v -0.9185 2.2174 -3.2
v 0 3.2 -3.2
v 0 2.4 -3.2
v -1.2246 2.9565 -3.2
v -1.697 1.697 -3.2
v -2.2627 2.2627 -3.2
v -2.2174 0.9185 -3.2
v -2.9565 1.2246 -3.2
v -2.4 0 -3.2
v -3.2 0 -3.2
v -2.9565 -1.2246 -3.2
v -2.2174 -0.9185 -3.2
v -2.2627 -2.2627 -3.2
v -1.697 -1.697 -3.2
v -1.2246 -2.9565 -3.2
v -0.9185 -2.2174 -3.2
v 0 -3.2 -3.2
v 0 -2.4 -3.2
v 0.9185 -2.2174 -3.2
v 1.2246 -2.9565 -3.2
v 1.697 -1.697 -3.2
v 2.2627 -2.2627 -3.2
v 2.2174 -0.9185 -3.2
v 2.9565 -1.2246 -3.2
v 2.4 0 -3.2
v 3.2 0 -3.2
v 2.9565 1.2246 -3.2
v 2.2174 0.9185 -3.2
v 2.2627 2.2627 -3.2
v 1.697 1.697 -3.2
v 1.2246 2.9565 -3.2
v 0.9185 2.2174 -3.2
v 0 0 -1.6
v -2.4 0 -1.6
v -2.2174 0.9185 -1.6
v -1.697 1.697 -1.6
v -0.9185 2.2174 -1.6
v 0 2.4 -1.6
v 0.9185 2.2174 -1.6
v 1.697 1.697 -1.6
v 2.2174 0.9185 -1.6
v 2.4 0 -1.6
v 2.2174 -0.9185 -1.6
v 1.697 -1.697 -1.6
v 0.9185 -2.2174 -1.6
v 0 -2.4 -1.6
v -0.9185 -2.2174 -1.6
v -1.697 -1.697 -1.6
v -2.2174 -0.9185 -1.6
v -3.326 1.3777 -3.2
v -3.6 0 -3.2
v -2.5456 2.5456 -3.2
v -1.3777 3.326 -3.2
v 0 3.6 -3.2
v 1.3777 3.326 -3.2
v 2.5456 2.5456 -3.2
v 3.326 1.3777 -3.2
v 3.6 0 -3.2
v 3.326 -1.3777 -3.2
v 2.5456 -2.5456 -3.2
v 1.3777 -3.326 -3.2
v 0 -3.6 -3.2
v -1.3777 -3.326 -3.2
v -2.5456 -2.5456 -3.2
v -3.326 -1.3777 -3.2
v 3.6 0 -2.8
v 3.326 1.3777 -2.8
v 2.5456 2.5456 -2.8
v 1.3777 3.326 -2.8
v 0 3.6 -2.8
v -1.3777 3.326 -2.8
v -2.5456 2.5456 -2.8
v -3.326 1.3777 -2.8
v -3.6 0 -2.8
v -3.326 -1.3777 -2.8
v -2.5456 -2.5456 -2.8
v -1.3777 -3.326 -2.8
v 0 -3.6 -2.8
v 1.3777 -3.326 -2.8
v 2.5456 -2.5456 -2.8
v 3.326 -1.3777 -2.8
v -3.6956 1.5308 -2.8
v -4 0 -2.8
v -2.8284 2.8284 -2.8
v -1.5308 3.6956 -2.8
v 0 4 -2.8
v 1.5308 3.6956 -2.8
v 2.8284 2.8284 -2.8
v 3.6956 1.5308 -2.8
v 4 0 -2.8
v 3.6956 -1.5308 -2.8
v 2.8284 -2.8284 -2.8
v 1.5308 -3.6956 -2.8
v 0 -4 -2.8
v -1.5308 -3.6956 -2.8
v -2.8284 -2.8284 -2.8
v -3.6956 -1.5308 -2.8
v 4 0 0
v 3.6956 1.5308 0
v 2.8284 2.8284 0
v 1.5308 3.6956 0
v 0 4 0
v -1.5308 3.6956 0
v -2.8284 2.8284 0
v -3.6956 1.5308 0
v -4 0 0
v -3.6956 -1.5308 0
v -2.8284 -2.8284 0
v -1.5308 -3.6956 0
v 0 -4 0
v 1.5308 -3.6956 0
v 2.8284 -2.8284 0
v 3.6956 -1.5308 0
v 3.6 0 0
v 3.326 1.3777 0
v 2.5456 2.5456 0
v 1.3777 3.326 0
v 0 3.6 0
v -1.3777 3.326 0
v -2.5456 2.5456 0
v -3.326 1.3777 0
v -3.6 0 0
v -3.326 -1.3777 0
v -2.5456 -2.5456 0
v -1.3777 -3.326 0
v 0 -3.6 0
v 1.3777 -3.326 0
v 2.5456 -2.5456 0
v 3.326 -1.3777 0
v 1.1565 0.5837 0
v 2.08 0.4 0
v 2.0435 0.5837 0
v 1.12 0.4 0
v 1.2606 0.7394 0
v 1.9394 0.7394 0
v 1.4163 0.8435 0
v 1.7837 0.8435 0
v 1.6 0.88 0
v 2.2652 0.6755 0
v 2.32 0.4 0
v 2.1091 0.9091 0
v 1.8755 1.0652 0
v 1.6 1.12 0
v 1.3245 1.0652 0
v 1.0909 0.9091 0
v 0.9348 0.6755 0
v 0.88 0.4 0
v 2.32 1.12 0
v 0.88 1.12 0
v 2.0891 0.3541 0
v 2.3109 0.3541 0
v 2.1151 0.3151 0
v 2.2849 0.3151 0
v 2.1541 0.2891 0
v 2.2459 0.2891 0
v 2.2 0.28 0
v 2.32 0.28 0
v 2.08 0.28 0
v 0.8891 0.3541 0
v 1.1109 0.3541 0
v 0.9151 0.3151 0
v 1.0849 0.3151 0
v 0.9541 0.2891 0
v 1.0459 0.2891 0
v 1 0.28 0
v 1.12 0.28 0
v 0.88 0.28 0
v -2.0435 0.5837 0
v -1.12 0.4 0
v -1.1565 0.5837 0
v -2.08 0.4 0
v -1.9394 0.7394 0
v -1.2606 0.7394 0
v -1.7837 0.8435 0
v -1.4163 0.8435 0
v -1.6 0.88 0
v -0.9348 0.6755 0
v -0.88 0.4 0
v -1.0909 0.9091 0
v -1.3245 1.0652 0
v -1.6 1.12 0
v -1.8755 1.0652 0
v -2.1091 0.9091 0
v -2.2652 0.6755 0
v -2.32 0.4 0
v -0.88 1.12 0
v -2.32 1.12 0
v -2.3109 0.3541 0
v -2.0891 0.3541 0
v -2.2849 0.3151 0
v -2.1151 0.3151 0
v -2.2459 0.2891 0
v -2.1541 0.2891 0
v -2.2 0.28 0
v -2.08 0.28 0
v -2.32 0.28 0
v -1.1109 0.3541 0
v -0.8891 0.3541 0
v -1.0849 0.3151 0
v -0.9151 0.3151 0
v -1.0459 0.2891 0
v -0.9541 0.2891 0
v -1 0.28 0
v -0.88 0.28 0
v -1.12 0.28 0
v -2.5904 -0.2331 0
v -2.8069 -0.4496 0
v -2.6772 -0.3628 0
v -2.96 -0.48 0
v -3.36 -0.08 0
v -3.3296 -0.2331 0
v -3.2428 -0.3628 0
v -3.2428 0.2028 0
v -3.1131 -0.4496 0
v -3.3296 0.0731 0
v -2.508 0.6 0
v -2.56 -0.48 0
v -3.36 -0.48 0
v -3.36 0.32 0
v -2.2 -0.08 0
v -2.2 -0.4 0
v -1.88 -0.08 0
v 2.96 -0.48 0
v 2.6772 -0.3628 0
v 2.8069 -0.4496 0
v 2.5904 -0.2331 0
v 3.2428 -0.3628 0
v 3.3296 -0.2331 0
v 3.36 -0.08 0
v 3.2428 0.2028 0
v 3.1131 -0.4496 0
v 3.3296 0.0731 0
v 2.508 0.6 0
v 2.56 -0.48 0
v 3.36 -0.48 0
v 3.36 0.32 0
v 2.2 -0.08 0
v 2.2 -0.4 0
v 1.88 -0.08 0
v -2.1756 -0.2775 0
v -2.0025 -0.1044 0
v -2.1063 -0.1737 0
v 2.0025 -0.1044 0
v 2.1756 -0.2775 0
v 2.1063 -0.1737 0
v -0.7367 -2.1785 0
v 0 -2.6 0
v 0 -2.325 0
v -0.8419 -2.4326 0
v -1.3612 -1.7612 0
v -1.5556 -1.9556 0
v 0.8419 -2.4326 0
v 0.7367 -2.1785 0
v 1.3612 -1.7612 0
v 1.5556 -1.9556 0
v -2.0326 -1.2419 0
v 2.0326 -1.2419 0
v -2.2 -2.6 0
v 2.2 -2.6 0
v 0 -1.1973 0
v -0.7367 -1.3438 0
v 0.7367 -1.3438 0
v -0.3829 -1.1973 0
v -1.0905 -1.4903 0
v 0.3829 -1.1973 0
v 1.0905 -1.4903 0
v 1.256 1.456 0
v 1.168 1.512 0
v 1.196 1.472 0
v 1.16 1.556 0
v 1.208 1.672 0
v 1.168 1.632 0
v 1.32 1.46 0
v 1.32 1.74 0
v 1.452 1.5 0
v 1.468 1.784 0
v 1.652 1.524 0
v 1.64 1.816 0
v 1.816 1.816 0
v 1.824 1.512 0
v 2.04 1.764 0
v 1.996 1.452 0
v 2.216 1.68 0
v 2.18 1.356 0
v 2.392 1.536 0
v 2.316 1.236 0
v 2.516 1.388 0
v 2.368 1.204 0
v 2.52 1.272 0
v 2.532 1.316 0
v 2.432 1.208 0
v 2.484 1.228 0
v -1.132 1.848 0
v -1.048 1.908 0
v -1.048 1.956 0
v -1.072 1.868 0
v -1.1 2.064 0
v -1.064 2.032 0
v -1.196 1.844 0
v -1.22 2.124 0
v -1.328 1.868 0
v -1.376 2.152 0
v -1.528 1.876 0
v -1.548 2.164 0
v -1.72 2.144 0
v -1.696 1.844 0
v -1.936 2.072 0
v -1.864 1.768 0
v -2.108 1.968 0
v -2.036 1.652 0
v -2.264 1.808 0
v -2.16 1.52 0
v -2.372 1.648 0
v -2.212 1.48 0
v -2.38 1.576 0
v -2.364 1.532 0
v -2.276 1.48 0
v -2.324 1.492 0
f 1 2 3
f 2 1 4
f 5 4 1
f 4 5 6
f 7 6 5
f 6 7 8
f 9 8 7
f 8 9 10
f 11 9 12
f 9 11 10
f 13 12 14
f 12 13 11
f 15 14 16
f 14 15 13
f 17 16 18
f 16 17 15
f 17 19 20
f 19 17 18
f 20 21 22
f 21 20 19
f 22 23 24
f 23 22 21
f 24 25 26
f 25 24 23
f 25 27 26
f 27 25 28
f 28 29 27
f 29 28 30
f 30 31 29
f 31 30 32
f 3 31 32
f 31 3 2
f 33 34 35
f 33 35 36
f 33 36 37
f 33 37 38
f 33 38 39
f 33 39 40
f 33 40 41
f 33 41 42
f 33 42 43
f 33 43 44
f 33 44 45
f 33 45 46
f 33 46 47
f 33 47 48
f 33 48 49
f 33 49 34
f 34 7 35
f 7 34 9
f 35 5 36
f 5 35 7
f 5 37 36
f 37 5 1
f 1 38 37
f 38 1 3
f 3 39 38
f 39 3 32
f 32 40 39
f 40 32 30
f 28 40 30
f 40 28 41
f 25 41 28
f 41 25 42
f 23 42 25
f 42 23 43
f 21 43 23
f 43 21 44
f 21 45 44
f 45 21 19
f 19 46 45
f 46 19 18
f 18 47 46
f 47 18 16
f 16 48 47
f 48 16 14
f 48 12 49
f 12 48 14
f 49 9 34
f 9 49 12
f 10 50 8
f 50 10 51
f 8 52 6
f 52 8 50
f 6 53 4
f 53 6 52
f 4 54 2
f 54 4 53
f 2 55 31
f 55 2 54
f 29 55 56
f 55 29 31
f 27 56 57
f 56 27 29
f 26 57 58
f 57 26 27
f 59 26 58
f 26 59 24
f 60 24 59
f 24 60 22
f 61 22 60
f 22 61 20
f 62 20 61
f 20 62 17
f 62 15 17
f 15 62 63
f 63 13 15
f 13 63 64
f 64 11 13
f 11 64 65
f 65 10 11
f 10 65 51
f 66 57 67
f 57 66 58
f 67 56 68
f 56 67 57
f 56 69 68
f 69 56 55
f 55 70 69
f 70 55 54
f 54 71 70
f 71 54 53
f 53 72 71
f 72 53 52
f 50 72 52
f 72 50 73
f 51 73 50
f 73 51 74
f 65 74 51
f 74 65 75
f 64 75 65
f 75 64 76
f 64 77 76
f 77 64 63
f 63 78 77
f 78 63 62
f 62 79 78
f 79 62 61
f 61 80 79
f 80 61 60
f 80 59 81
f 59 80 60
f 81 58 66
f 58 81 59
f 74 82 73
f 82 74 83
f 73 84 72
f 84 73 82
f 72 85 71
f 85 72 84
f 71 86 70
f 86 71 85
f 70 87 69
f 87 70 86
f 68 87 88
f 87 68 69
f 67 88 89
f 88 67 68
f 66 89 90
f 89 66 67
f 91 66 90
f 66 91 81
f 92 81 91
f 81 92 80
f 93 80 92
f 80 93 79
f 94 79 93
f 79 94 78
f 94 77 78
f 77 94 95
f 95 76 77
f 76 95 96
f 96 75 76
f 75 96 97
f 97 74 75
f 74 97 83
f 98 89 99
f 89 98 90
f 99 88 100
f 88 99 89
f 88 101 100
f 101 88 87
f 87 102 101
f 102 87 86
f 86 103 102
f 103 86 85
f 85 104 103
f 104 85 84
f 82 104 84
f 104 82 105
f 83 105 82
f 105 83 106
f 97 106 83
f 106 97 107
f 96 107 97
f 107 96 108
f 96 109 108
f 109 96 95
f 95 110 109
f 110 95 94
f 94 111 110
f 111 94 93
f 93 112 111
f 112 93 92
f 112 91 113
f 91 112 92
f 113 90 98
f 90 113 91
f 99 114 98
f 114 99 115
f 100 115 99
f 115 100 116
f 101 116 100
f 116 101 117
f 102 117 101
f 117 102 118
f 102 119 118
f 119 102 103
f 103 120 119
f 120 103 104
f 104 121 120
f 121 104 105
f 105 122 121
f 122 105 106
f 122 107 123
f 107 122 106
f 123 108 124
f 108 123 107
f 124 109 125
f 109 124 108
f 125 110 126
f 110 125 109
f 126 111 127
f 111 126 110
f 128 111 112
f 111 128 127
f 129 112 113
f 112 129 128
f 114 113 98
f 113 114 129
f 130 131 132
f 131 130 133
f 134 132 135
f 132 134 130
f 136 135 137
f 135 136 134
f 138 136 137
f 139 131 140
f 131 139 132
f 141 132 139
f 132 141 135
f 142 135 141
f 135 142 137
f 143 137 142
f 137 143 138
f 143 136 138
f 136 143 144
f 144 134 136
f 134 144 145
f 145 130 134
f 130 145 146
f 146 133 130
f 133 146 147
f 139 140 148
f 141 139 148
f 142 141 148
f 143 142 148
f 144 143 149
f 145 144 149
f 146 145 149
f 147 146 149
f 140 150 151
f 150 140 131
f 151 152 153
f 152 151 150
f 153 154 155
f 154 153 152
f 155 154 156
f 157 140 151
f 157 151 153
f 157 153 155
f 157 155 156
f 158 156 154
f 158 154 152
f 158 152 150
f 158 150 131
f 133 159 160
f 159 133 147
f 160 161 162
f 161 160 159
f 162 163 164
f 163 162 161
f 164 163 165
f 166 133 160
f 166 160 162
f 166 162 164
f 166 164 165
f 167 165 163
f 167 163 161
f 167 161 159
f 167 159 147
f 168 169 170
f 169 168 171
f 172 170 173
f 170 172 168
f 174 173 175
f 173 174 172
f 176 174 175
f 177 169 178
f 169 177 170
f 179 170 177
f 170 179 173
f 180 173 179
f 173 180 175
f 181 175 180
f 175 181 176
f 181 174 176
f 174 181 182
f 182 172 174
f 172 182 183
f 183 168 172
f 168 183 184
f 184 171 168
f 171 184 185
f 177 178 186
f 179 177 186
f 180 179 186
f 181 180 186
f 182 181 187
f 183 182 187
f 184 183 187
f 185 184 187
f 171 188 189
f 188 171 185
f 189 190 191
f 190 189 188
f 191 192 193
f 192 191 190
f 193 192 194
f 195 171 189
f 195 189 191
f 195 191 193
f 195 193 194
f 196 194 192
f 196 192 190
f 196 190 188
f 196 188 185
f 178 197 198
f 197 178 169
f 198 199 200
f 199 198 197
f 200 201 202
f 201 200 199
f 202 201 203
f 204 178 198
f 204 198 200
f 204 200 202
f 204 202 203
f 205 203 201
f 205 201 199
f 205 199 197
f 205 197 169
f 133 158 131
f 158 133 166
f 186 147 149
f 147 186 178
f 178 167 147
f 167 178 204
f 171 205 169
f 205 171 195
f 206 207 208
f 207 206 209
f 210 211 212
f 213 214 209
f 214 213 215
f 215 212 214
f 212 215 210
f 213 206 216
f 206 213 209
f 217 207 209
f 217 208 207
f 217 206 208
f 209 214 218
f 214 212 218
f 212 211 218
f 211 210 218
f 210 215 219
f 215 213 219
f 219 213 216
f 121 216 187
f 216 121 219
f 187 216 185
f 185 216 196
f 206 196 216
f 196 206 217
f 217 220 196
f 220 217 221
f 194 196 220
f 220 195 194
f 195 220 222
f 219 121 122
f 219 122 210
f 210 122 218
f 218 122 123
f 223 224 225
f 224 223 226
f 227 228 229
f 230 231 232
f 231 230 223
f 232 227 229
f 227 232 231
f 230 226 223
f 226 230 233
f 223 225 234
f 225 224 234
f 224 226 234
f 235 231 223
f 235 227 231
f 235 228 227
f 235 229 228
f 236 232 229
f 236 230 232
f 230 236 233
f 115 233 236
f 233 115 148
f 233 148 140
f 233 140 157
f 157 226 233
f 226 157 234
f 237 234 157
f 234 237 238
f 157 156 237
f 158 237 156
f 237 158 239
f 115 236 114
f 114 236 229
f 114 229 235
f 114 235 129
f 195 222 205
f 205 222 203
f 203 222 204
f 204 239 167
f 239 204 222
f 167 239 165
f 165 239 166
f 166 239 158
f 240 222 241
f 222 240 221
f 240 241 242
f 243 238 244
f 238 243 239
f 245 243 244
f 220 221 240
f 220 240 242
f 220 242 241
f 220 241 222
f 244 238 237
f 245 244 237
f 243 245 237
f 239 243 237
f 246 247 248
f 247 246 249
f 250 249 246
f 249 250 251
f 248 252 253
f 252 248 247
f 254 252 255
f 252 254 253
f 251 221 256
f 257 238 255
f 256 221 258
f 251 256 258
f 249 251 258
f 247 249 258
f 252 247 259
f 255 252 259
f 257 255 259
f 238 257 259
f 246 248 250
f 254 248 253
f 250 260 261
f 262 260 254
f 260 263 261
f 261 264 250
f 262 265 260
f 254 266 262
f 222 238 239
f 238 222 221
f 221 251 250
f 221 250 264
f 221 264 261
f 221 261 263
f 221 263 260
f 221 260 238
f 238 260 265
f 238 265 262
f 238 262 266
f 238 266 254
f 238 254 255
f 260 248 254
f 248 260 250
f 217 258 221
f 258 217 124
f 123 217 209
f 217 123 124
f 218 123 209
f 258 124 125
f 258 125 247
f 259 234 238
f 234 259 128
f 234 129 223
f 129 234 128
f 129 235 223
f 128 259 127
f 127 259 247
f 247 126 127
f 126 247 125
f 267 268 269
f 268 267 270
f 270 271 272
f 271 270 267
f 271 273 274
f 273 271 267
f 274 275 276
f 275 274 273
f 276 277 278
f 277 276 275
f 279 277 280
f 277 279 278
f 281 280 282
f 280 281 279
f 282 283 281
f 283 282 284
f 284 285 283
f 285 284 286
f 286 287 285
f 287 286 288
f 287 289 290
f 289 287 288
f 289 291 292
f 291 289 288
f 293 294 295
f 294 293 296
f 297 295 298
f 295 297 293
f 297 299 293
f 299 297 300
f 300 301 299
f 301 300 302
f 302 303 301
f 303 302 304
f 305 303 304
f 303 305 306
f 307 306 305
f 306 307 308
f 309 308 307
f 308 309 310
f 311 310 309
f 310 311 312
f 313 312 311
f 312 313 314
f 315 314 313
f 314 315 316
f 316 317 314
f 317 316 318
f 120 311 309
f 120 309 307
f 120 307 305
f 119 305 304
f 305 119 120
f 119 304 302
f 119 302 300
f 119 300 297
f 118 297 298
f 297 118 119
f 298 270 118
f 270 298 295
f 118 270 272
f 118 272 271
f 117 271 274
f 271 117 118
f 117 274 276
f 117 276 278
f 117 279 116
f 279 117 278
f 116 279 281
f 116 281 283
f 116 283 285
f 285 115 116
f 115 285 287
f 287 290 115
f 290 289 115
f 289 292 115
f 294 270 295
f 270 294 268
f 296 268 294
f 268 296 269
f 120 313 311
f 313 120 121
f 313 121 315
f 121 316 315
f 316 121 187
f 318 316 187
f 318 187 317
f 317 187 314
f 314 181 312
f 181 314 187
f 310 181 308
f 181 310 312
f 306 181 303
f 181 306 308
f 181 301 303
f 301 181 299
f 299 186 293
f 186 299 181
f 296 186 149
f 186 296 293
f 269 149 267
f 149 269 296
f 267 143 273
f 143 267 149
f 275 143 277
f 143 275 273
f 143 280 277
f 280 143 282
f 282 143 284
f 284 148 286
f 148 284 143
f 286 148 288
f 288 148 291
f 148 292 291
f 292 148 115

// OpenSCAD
use <../lib.scad>
use <../p/1-4chrd.scad>
use <../p/1-4ndis.scad>
use <../p/1-8chrd.scad>
use <../p/1-8ring7.scad>
use <../p/1-8tang.scad>
use <../p/2-4chrd.scad>
use <../p/2-4ndis.scad>
use <../p/2-4ring2.scad>
use <../p/3-16chrd.scad>
use <../p/3-16ndis.scad>
use <../p/3-8chrd.scad>
use <../p/3-8ndis.scad>
use <../p/4-4ering.scad>
use <s/98138s01.scad>
function ldraw_lib__98138p1t() = [
// 0 Tile  1 x  1 Round with Bright Light Yellow Emoji with Wide Open Laughing Mouth with Coral Tongue and Medium Azure Tears of Joy Pattern
// 0 Name: 98138p1t.dat
// 0 Author: Gerald Lasser [GeraldLasser]
// 0 !LDRAW_ORG Part UPDATE 2022-01
// 0 !LICENSE Licensed under CC BY 4.0 : see CAreadme.txt
// 
// 0 BFC CERTIFY CCW
  [0,"BFC","CERTIFY"],
  [0,"BFC","CCW"],
// 
// 0 !KEYWORDS Bricklink 98138pb130, Creativity Box, Dots, Funny, happy, Set 41908
// 0 !KEYWORDS Squinted Eyes
// 
// 0 !HISTORY 2022-01-14 [PTadmin] Official Update 2022-01
// 
// 
// 1 16 0 0 0 1 0 0 0 1 0 0 0 1 s\98138s01.dat
  [1,16,0,0,0,1,0,0,0,1,0,0,0,1, ldraw_lib__s__98138s01()],
// 1 226 0 0 0 9 0 0 0 1 0 0 0 9 4-4ering.dat
  [1,226,0,0,0,9,0,0,0,1,0,0,0,9, ldraw_lib__4_4ering()],
// 
// 0 // Eyes
// 1 226 4 0 1 1.2 0 0 0 1 0 0 0 1.2 2-4chrd.dat
  [1,226,4,0,1,1.2,0,0,0,1,0,0,0,1.2, ldraw_lib__2_4chrd()],
// 1 0 4 0 1 .6 0 0 0 1 0 0 0 .6 2-4ring2.dat
  [1,0,4,0,1,.6,0,0,0,1,0,0,0,.6, ldraw_lib__2_4ring2()],
// 1 226 4 0 1 1.8 0 0 0 1 0 0 0 1.8 2-4ndis.dat
  [1,226,4,0,1,1.8,0,0,0,1,0,0,0,1.8, ldraw_lib__2_4ndis()],
// 1 0 5.5 0 1 .3 0 0 0 1 0 0 0 -.3 2-4chrd.dat
  [1,0,5.5,0,1,.3,0,0,0,1,0,0,0,-.3, ldraw_lib__2_4chrd()],
// 1 226 5.5 0 1 .3 0 0 0 1 0 0 0 -.3 2-4ndis.dat
  [1,226,5.5,0,1,.3,0,0,0,1,0,0,0,-.3, ldraw_lib__2_4ndis()],
// 1 0 2.5 0 1 .3 0 0 0 1 0 0 0 -.3 2-4chrd.dat
  [1,0,2.5,0,1,.3,0,0,0,1,0,0,0,-.3, ldraw_lib__2_4chrd()],
// 1 226 2.5 0 1 .3 0 0 0 1 0 0 0 -.3 2-4ndis.dat
  [1,226,2.5,0,1,.3,0,0,0,1,0,0,0,-.3, ldraw_lib__2_4ndis()],
// 
// 1 226 -4 0 1 1.2 0 0 0 1 0 0 0 1.2 2-4chrd.dat
  [1,226,-4,0,1,1.2,0,0,0,1,0,0,0,1.2, ldraw_lib__2_4chrd()],
// 1 0 -4 0 1 .6 0 0 0 1 0 0 0 .6 2-4ring2.dat
  [1,0,-4,0,1,.6,0,0,0,1,0,0,0,.6, ldraw_lib__2_4ring2()],
// 1 226 -4 0 1 1.8 0 0 0 1 0 0 0 1.8 2-4ndis.dat
  [1,226,-4,0,1,1.8,0,0,0,1,0,0,0,1.8, ldraw_lib__2_4ndis()],
// 1 0 -5.5 0 1 .3 0 0 0 1 0 0 0 -.3 2-4chrd.dat
  [1,0,-5.5,0,1,.3,0,0,0,1,0,0,0,-.3, ldraw_lib__2_4chrd()],
// 1 226 -5.5 0 1 .3 0 0 0 1 0 0 0 -.3 2-4ndis.dat
  [1,226,-5.5,0,1,.3,0,0,0,1,0,0,0,-.3, ldraw_lib__2_4ndis()],
// 1 0 -2.5 0 1 .3 0 0 0 1 0 0 0 -.3 2-4chrd.dat
  [1,0,-2.5,0,1,.3,0,0,0,1,0,0,0,-.3, ldraw_lib__2_4chrd()],
// 1 226 -2.5 0 1 .3 0 0 0 1 0 0 0 -.3 2-4ndis.dat
  [1,226,-2.5,0,1,.3,0,0,0,1,0,0,0,-.3, ldraw_lib__2_4ndis()],
// 
// 4 226 2.8 0 1 2.8 0 .7 5.2 0 .7 5.2 0 1
  [4,226,2.8,0,1,2.8,0,.7,5.2,0,.7,5.2,0,1],
// 4 226 -2.2 0 1 2.2 0 1 2.2 0 2.8 -2.2 0 2.8
  [4,226,-2.2,0,1,2.2,0,1,2.2,0,2.8,-2.2,0,2.8],
// 4 226 -2.2 0 .7 2.2 0 .7 2.2 0 1 -2.2 0 1
  [4,226,-2.2,0,.7,2.2,0,.7,2.2,0,1,-2.2,0,1],
// 4 226 -2.8 0 1 -5.2 0 1 -5.2 0 .7 -2.8 0 .7
  [4,226,-2.8,0,1,-5.2,0,1,-5.2,0,.7,-2.8,0,.7],
// 
// 0 // Tears
// 1 322 -7.4 0 -.2 0 0 1 0 1 0 -1 0 0 3-16chrd.dat
  [1,322,-7.4,0,-.2,0,0,1,0,1,0,-1,0,0, ldraw_lib__3_16chrd()],
// 1 322 -7.4 0 -.2 0 0 -1 0 1 0 -1 0 0 3-8chrd.dat
  [1,322,-7.4,0,-.2,0,0,-1,0,1,0,-1,0,0, ldraw_lib__3_8chrd()],
// 4 322 -6.27 0 1.5 -8.1071 0 .5071 -7.4 0 -1.2 -6.4761 0 -.5827
  [4,322,-6.27,0,1.5,-8.1071,0,.5071,-7.4,0,-1.2,-6.4761,0,-.5827],
// 1 226 -7.4 0 -.2 0 0 1 0 1 0 -1 0 0 3-16ndis.dat
  [1,226,-7.4,0,-.2,0,0,1,0,1,0,-1,0,0, ldraw_lib__3_16ndis()],
// 1 226 -7.4 0 -.2 0 0 -1 0 1 0 -1 0 0 3-8ndis.dat
  [1,226,-7.4,0,-.2,0,0,-1,0,1,0,-1,0,0, ldraw_lib__3_8ndis()],
// 
// 3 226 -8.4 0 .8 -8.1071 0 .5071 -6.27 0 1.5
  [3,226,-8.4,0,.8,-8.1071,0,.5071,-6.27,0,1.5],
// 4 226 -8.4 0 .8 -6.27 0 1.5 -5.8 0 2.8 -8.3151 0 3.4443
  [4,226,-8.4,0,.8,-6.27,0,1.5,-5.8,0,2.8,-8.3151,0,3.4443],
// 3 226 -5.8 0 2.8 -6.27 0 1.5 -5.8 0 1
  [3,226,-5.8,0,2.8,-6.27,0,1.5,-5.8,0,1],
// 3 226 -5.8 0 1 -6.27 0 1.5 -5.8 0 .7
  [3,226,-5.8,0,1,-6.27,0,1.5,-5.8,0,.7],
// 4 226 -6.4 0 -1.2 -5.8 0 .7 -6.27 0 1.5 -6.4761 0 -.5827
  [4,226,-6.4,0,-1.2,-5.8,0,.7,-6.27,0,1.5,-6.4761,0,-.5827],
// 4 226 -5.5 0 -1 -5.5 0 -.2 -5.8 0 .7 -6.4 0 -1.2
  [4,226,-5.5,0,-1,-5.5,0,-.2,-5.8,0,.7,-6.4,0,-1.2],
// 3 226 -5.5 0 .7 -5.8 0 .7 -5.5 0 -.2
  [3,226,-5.5,0,.7,-5.8,0,.7,-5.5,0,-.2],
// 4 226 -4.7 0 -.2 -5.2 0 .7 -5.5 0 .7 -5.5 0 -.2
  [4,226,-4.7,0,-.2,-5.2,0,.7,-5.5,0,.7,-5.5,0,-.2],
// 3 226 -8.4 0 .8 -8.3151 0 3.4443 -9 0 0
  [3,226,-8.4,0,.8,-8.3151,0,3.4443,-9,0,0],
// 3 226 -8.4 0 .8 -9 0 0 -8.4 0 -.2
  [3,226,-8.4,0,.8,-9,0,0,-8.4,0,-.2],
// 3 226 -8.4 0 -.2 -9 0 0 -8.4 0 -1.2
  [3,226,-8.4,0,-.2,-9,0,0,-8.4,0,-1.2],
// 3 226 -8.4 0 -1.2 -9 0 0 -8.3151 0 -3.4443
  [3,226,-8.4,0,-1.2,-9,0,0,-8.3151,0,-3.4443],
// 
// 1 322 7.4 0 -.2 0 0 -1 0 1 0 -1 0 0 3-16chrd.dat
  [1,322,7.4,0,-.2,0,0,-1,0,1,0,-1,0,0, ldraw_lib__3_16chrd()],
// 1 322 7.4 0 -.2 0 0 1 0 1 0 -1 0 0 3-8chrd.dat
  [1,322,7.4,0,-.2,0,0,1,0,1,0,-1,0,0, ldraw_lib__3_8chrd()],
// 4 322 7.4 0 -1.2 8.1071 0 .5071 6.27 0 1.5 6.4761 0 -.5827
  [4,322,7.4,0,-1.2,8.1071,0,.5071,6.27,0,1.5,6.4761,0,-.5827],
// 1 226 7.4 0 -.2 0 0 -1 0 1 0 -1 0 0 3-16ndis.dat
  [1,226,7.4,0,-.2,0,0,-1,0,1,0,-1,0,0, ldraw_lib__3_16ndis()],
// 1 226 7.4 0 -.2 0 0 1 0 1 0 -1 0 0 3-8ndis.dat
  [1,226,7.4,0,-.2,0,0,1,0,1,0,-1,0,0, ldraw_lib__3_8ndis()],
// 
// 3 226 8.1071 0 .5071 8.4 0 .8 6.27 0 1.5
  [3,226,8.1071,0,.5071,8.4,0,.8,6.27,0,1.5],
// 4 226 5.8 0 2.8 6.27 0 1.5 8.4 0 .8 8.3151 0 3.4443
  [4,226,5.8,0,2.8,6.27,0,1.5,8.4,0,.8,8.3151,0,3.4443],
// 3 226 6.27 0 1.5 5.8 0 2.8 5.8 0 1
  [3,226,6.27,0,1.5,5.8,0,2.8,5.8,0,1],
// 3 226 6.27 0 1.5 5.8 0 1 5.8 0 .7
  [3,226,6.27,0,1.5,5.8,0,1,5.8,0,.7],
// 4 226 6.27 0 1.5 5.8 0 .7 6.4 0 -1.2 6.4761 0 -.5827
  [4,226,6.27,0,1.5,5.8,0,.7,6.4,0,-1.2,6.4761,0,-.5827],
// 4 226 5.8 0 .7 5.5 0 -.2 5.5 0 -1 6.4 0 -1.2
  [4,226,5.8,0,.7,5.5,0,-.2,5.5,0,-1,6.4,0,-1.2],
// 3 226 5.8 0 .7 5.5 0 .7 5.5 0 -.2
  [3,226,5.8,0,.7,5.5,0,.7,5.5,0,-.2],
// 4 226 5.5 0 .7 5.2 0 .7 4.7 0 -.2 5.5 0 -.2
  [4,226,5.5,0,.7,5.2,0,.7,4.7,0,-.2,5.5,0,-.2],
// 3 226 8.3151 0 3.4443 8.4 0 .8 9 0 0
  [3,226,8.3151,0,3.4443,8.4,0,.8,9,0,0],
// 3 226 9 0 0 8.4 0 .8 8.4 0 -.2
  [3,226,9,0,0,8.4,0,.8,8.4,0,-.2],
// 3 226 9 0 0 8.4 0 -.2 8.4 0 -1.2
  [3,226,9,0,0,8.4,0,-.2,8.4,0,-1.2],
// 3 226 9 0 0 8.4 0 -1.2 8.3151 0 -3.4443
  [3,226,9,0,0,8.4,0,-1.2,8.3151,0,-3.4443],
// 
// 0 // Mouth
// 3 226 -5.2 0 .7 -4.7 0 -.2 -2.8 0 .7
  [3,226,-5.2,0,.7,-4.7,0,-.2,-2.8,0,.7],
// 3 226 -2.8 0 .7 -4.7 0 -.2 -2.5 0 .7
  [3,226,-2.8,0,.7,-4.7,0,-.2,-2.5,0,.7],
// 3 226 -2.5 0 .7 -4.7 0 -.2 -2.2 0 .7
  [3,226,-2.5,0,.7,-4.7,0,-.2,-2.2,0,.7],
// 4 226 4.7 0 -.2 2.2 0 .7 -2.2 0 .7 -4.7 0 -.2
  [4,226,4.7,0,-.2,2.2,0,.7,-2.2,0,.7,-4.7,0,-.2],
// 3 226 2.2 0 .7 4.7 0 -.2 2.5 0 .7
  [3,226,2.2,0,.7,4.7,0,-.2,2.5,0,.7],
// 3 226 2.5 0 .7 4.7 0 -.2 2.8 0 .7
  [3,226,2.5,0,.7,4.7,0,-.2,2.8,0,.7],
// 3 226 2.8 0 .7 4.7 0 -.2 5.2 0 .7
  [3,226,2.8,0,.7,4.7,0,-.2,5.2,0,.7],
// 
// 1 0 -4.7 0 -1 -.8 0 0 0 1 0 0 0 .8 1-4chrd.dat
  [1,0,-4.7,0,-1,-.8,0,0,0,1,0,0,0,.8, ldraw_lib__1_4chrd()],
// 1 0 4.7 0 -1 .8 0 0 0 1 0 0 0 .8 1-4chrd.dat
  [1,0,4.7,0,-1,.8,0,0,0,1,0,0,0,.8, ldraw_lib__1_4chrd()],
// 1 226 -4.7 0 -1 -.8 0 0 0 1 0 0 0 .8 1-4ndis.dat
  [1,226,-4.7,0,-1,-.8,0,0,0,1,0,0,0,.8, ldraw_lib__1_4ndis()],
// 1 226 4.7 0 -1 .8 0 0 0 1 0 0 0 .8 1-4ndis.dat
  [1,226,4.7,0,-1,.8,0,0,0,1,0,0,0,.8, ldraw_lib__1_4ndis()],
// 1 0 0 0 -1 0 0 -.6875 0 1 0 -.6875 0 0 1-8ring7.dat
  [1,0,0,0,-1,0,0,-.6875,0,1,0,-.6875,0,0, ldraw_lib__1_8ring7()],
// 1 0 0 0 -1 0 0 .6875 0 1 0 -.6875 0 0 1-8ring7.dat
  [1,0,0,0,-1,0,0,.6875,0,1,0,-.6875,0,0, ldraw_lib__1_8ring7()],
// 1 0 0 0 -1 -5.5 0 0 0 1 0 0 0 -5.5 1-8chrd.dat
  [1,0,0,0,-1,-5.5,0,0,0,1,0,0,0,-5.5, ldraw_lib__1_8chrd()],
// 1 0 0 0 -1 5.5 0 0 0 1 0 0 0 -5.5 1-8chrd.dat
  [1,0,0,0,-1,5.5,0,0,0,1,0,0,0,-5.5, ldraw_lib__1_8chrd()],
// 1 226 0 0 -1 -5.5 0 0 0 1 0 0 0 -5.5 2-4ndis.dat
  [1,226,0,0,-1,-5.5,0,0,0,1,0,0,0,-5.5, ldraw_lib__2_4ndis()],
// 
// 1 353 0 0 -1 0 0 -4.8125 0 1 0 -4.8125 0 0 1-8chrd.dat
  [1,353,0,0,-1,0,0,-4.8125,0,1,0,-4.8125,0,0, ldraw_lib__1_8chrd()],
// 1 353 0 0 -1 0 0 4.8125 0 1 0 -4.8125 0 0 1-8chrd.dat
  [1,353,0,0,-1,0,0,4.8125,0,1,0,-4.8125,0,0, ldraw_lib__1_8chrd()],
// 1 353 0 0 -7.8058 0 0 -4.8125 0 1 0 4.8125 0 0 1-8chrd.dat
  [1,353,0,0,-7.8058,0,0,-4.8125,0,1,0,4.8125,0,0, ldraw_lib__1_8chrd()],
// 1 353 0 0 -7.8058 0 0 4.8125 0 1 0 4.8125 0 0 1-8chrd.dat
  [1,353,0,0,-7.8058,0,0,4.8125,0,1,0,4.8125,0,0, ldraw_lib__1_8chrd()],
// 1 0 0 0 -7.8058 0 0 -4.8125 0 1 0 4.8125 0 0 1-8tang.dat
  [1,0,0,0,-7.8058,0,0,-4.8125,0,1,0,4.8125,0,0, ldraw_lib__1_8tang()],
// 1 0 0 0 -7.8058 0 0 4.8125 0 1 0 4.8125 0 0 1-8tang.dat
  [1,0,0,0,-7.8058,0,0,4.8125,0,1,0,4.8125,0,0, ldraw_lib__1_8tang()],
// 4 0 4.7 0 -.2 -4.7 0 -.2 -5.5 0 -1 5.5 0 -1
  [4,0,4.7,0,-.2,-4.7,0,-.2,-5.5,0,-1,5.5,0,-1],
// 3 0 -5.5 0 -1 -3.8891 0 -4.8891 -3.4029 0 -4.4029
  [3,0,-5.5,0,-1,-3.8891,0,-4.8891,-3.4029,0,-4.4029],
// 3 0 -5.5 0 -1 -3.4029 0 -4.4029 -2.7263 0 -3.7258
  [3,0,-5.5,0,-1,-3.4029,0,-4.4029,-2.7263,0,-3.7258],
// 3 0 -5.5 0 -1 -2.7263 0 -3.7258 -1.8417 0 -3.3595
  [3,0,-5.5,0,-1,-2.7263,0,-3.7258,-1.8417,0,-3.3595],
// 3 0 -5.5 0 -1 -1.8417 0 -3.3595 -.9572 0 -2.9933
  [3,0,-5.5,0,-1,-1.8417,0,-3.3595,-.9572,0,-2.9933],
// 3 0 -5.5 0 -1 -.9572 0 -2.9933 0 0 -2.9933
  [3,0,-5.5,0,-1,-.9572,0,-2.9933,0,0,-2.9933],
// 3 0 -5.5 0 -1 0 0 -2.9933 5.5 0 -1
  [3,0,-5.5,0,-1,0,0,-2.9933,5.5,0,-1],
// 3 0 5.5 0 -1 0 0 -2.9933 .9572 0 -2.9933
  [3,0,5.5,0,-1,0,0,-2.9933,.9572,0,-2.9933],
// 3 0 5.5 0 -1 .9572 0 -2.9933 1.8417 0 -3.3595
  [3,0,5.5,0,-1,.9572,0,-2.9933,1.8417,0,-3.3595],
// 3 0 5.5 0 -1 1.8417 0 -3.3595 2.7263 0 -3.7258
  [3,0,5.5,0,-1,1.8417,0,-3.3595,2.7263,0,-3.7258],
// 3 0 5.5 0 -1 2.7263 0 -3.7258 3.4029 0 -4.4029
  [3,0,5.5,0,-1,2.7263,0,-3.7258,3.4029,0,-4.4029],
// 3 0 5.5 0 -1 3.4029 0 -4.4029 3.8891 0 -4.8891
  [3,0,5.5,0,-1,3.4029,0,-4.4029,3.8891,0,-4.8891],
// 4 353 0 0 -2.9933 -3.4029 0 -4.4029 0 0 -5.8125 3.4029 0 -4.4029
  [4,353,0,0,-2.9933,-3.4029,0,-4.4029,0,0,-5.8125,3.4029,0,-4.4029],
// 
// 4 226 -5.5 0 -6.5 -5.5 0 -1 -6.4 0 -1.2 -6.3639 0 -6.3639
  [4,226,-5.5,0,-6.5,-5.5,0,-1,-6.4,0,-1.2,-6.3639,0,-6.3639],
// 4 226 -8.3151 0 -3.4443 -6.3639 0 -6.3639 -6.4 0 -1.2 -7.4 0 -1.2
  [4,226,-8.3151,0,-3.4443,-6.3639,0,-6.3639,-6.4,0,-1.2,-7.4,0,-1.2],
// 3 226 -8.4 0 -1.2 -8.3151 0 -3.4443 -7.4 0 -1.2
  [3,226,-8.4,0,-1.2,-8.3151,0,-3.4443,-7.4,0,-1.2],
// 3 226 -5.5 0 -6.5 -6.3639 0 -6.3639 -3.4443 0 -8.3151
  [3,226,-5.5,0,-6.5,-6.3639,0,-6.3639,-3.4443,0,-8.3151],
// 3 226 -5.5 0 -6.5 -3.4443 0 -8.3151 0 0 -6.5
  [3,226,-5.5,0,-6.5,-3.4443,0,-8.3151,0,0,-6.5],
// 4 226 6.4 0 -1.2 5.5 0 -1 5.5 0 -6.5 6.3639 0 -6.3639
  [4,226,6.4,0,-1.2,5.5,0,-1,5.5,0,-6.5,6.3639,0,-6.3639],
// 4 226 6.4 0 -1.2 6.3639 0 -6.3639 8.3151 0 -3.4443 7.4 0 -1.2
  [4,226,6.4,0,-1.2,6.3639,0,-6.3639,8.3151,0,-3.4443,7.4,0,-1.2],
// 3 226 8.3151 0 -3.4443 8.4 0 -1.2 7.4 0 -1.2
  [3,226,8.3151,0,-3.4443,8.4,0,-1.2,7.4,0,-1.2],
// 3 226 6.3639 0 -6.3639 5.5 0 -6.5 3.4443 0 -8.3151
  [3,226,6.3639,0,-6.3639,5.5,0,-6.5,3.4443,0,-8.3151],
// 3 226 3.4443 0 -8.3151 5.5 0 -6.5 0 0 -6.5
  [3,226,3.4443,0,-8.3151,5.5,0,-6.5,0,0,-6.5],
// 4 226 0 0 -9 3.4443 0 -8.3151 0 0 -6.5 -3.4443 0 -8.3151
  [4,226,0,0,-9,3.4443,0,-8.3151,0,0,-6.5,-3.4443,0,-8.3151],
// 
// 0 // Brows
// 4 0 2.92 0 3.78 2.99 0 3.68 3.14 0 3.64 2.9 0 3.89
  [4,0,2.92,0,3.78,2.99,0,3.68,3.14,0,3.64,2.9,0,3.89],
// 4 0 2.92 0 4.08 2.9 0 3.89 3.14 0 3.64 3.02 0 4.18
  [4,0,2.92,0,4.08,2.9,0,3.89,3.14,0,3.64,3.02,0,4.18],
// 4 0 3.02 0 4.18 3.14 0 3.64 3.3 0 3.65 3.3 0 4.35
  [4,0,3.02,0,4.18,3.14,0,3.64,3.3,0,3.65,3.3,0,4.35],
// 4 0 3.67 0 4.46 3.3 0 4.35 3.3 0 3.65 3.63 0 3.75
  [4,0,3.67,0,4.46,3.3,0,4.35,3.3,0,3.65,3.63,0,3.75],
// 4 0 4.1 0 4.54 3.67 0 4.46 3.63 0 3.75 4.13 0 3.81
  [4,0,4.1,0,4.54,3.67,0,4.46,3.63,0,3.75,4.13,0,3.81],
// 4 0 4.54 0 4.54 4.1 0 4.54 4.13 0 3.81 4.56 0 3.78
  [4,0,4.54,0,4.54,4.1,0,4.54,4.13,0,3.81,4.56,0,3.78],
// 4 0 5.1 0 4.41 4.54 0 4.54 4.56 0 3.78 4.99 0 3.63
  [4,0,5.1,0,4.41,4.54,0,4.54,4.56,0,3.78,4.99,0,3.63],
// 4 0 5.54 0 4.2 5.1 0 4.41 4.99 0 3.63 5.45 0 3.39
  [4,0,5.54,0,4.2,5.1,0,4.41,4.99,0,3.63,5.45,0,3.39],
// 4 0 5.98 0 3.84 5.54 0 4.2 5.45 0 3.39 5.79 0 3.09
  [4,0,5.98,0,3.84,5.54,0,4.2,5.45,0,3.39,5.79,0,3.09],
// 4 0 6.29 0 3.47 5.98 0 3.84 5.79 0 3.09 5.92 0 3.01
  [4,0,6.29,0,3.47,5.98,0,3.84,5.79,0,3.09,5.92,0,3.01],
// 4 0 6.33 0 3.29 6.29 0 3.47 5.92 0 3.01 6.3 0 3.18
  [4,0,6.33,0,3.29,6.29,0,3.47,5.92,0,3.01,6.3,0,3.18],
// 4 0 6.3 0 3.18 5.92 0 3.01 6.08 0 3.02 6.21 0 3.07
  [4,0,6.3,0,3.18,5.92,0,3.01,6.08,0,3.02,6.21,0,3.07],
// 4 0 -2.83 0 4.62 -2.68 0 4.67 -2.62 0 4.77 -2.62 0 4.89
  [4,0,-2.83,0,4.62,-2.68,0,4.67,-2.62,0,4.77,-2.62,0,4.89],
// 4 0 -2.83 0 4.62 -2.62 0 4.89 -2.66 0 5.08 -2.75 0 5.16
  [4,0,-2.83,0,4.62,-2.62,0,4.89,-2.66,0,5.08,-2.75,0,5.16],
// 4 0 -2.99 0 4.61 -2.83 0 4.62 -2.75 0 5.16 -3.05 0 5.31
  [4,0,-2.99,0,4.61,-2.83,0,4.62,-2.75,0,5.16,-3.05,0,5.31],
// 4 0 -2.99 0 4.61 -3.05 0 5.31 -3.44 0 5.38 -3.32 0 4.67
  [4,0,-2.99,0,4.61,-3.05,0,5.31,-3.44,0,5.38,-3.32,0,4.67],
// 4 0 -3.32 0 4.67 -3.44 0 5.38 -3.87 0 5.41 -3.82 0 4.69
  [4,0,-3.32,0,4.67,-3.44,0,5.38,-3.87,0,5.41,-3.82,0,4.69],
// 4 0 -3.82 0 4.69 -3.87 0 5.41 -4.3 0 5.36 -4.24 0 4.61
  [4,0,-3.82,0,4.69,-3.87,0,5.41,-4.3,0,5.36,-4.24,0,4.61],
// 4 0 -4.24 0 4.61 -4.3 0 5.36 -4.84 0 5.18 -4.66 0 4.42
  [4,0,-4.24,0,4.61,-4.3,0,5.36,-4.84,0,5.18,-4.66,0,4.42],
// 4 0 -4.66 0 4.42 -4.84 0 5.18 -5.27 0 4.92 -5.09 0 4.13
  [4,0,-4.66,0,4.42,-4.84,0,5.18,-5.27,0,4.92,-5.09,0,4.13],
// 4 0 -5.09 0 4.13 -5.27 0 4.92 -5.66 0 4.52 -5.4 0 3.8
  [4,0,-5.09,0,4.13,-5.27,0,4.92,-5.66,0,4.52,-5.4,0,3.8],
// 4 0 -5.4 0 3.8 -5.66 0 4.52 -5.93 0 4.12 -5.53 0 3.7
  [4,0,-5.4,0,3.8,-5.66,0,4.52,-5.93,0,4.12,-5.53,0,3.7],
// 4 0 -5.53 0 3.7 -5.93 0 4.12 -5.95 0 3.94 -5.91 0 3.83
  [4,0,-5.53,0,3.7,-5.93,0,4.12,-5.95,0,3.94,-5.91,0,3.83],
// 4 0 -5.69 0 3.7 -5.53 0 3.7 -5.91 0 3.83 -5.81 0 3.73
  [4,0,-5.69,0,3.7,-5.53,0,3.7,-5.91,0,3.83,-5.81,0,3.73],
// 3 226 -6.3639 0 6.3639 -5.66 0 4.52 -5.27 0 4.92
  [3,226,-6.3639,0,6.3639,-5.66,0,4.52,-5.27,0,4.92],
// 3 226 -6.3639 0 6.3639 -5.27 0 4.92 -4.84 0 5.18
  [3,226,-6.3639,0,6.3639,-5.27,0,4.92,-4.84,0,5.18],
// 3 226 -6.3639 0 6.3639 -4.84 0 5.18 -4.3 0 5.36
  [3,226,-6.3639,0,6.3639,-4.84,0,5.18,-4.3,0,5.36],
// 4 226 -6.3639 0 6.3639 -4.3 0 5.36 -3.87 0 5.41 -3.4443 0 8.3151
  [4,226,-6.3639,0,6.3639,-4.3,0,5.36,-3.87,0,5.41,-3.4443,0,8.3151],
// 3 226 -3.4443 0 8.3151 -3.87 0 5.41 -3.44 0 5.38
  [3,226,-3.4443,0,8.3151,-3.87,0,5.41,-3.44,0,5.38],
// 3 226 -3.4443 0 8.3151 -3.44 0 5.38 -3.05 0 5.31
  [3,226,-3.4443,0,8.3151,-3.44,0,5.38,-3.05,0,5.31],
// 3 226 -3.4443 0 8.3151 -3.05 0 5.31 -2.75 0 5.16
  [3,226,-3.4443,0,8.3151,-3.05,0,5.31,-2.75,0,5.16],
// 4 226 -3.4443 0 8.3151 -2.75 0 5.16 -2.66 0 5.08 0 0 9
  [4,226,-3.4443,0,8.3151,-2.75,0,5.16,-2.66,0,5.08,0,0,9],
// 4 226 0 0 9 -2.66 0 5.08 -2.62 0 4.89 2.9 0 3.89
  [4,226,0,0,9,-2.66,0,5.08,-2.62,0,4.89,2.9,0,3.89],
// 3 226 0 0 9 2.9 0 3.89 2.92 0 4.08
  [3,226,0,0,9,2.9,0,3.89,2.92,0,4.08],
// 3 226 0 0 9 2.92 0 4.08 3.02 0 4.18
  [3,226,0,0,9,2.92,0,4.08,3.02,0,4.18],
// 4 226 0 0 9 3.02 0 4.18 3.3 0 4.35 3.4443 0 8.3151
  [4,226,0,0,9,3.02,0,4.18,3.3,0,4.35,3.4443,0,8.3151],
// 3 226 3.4443 0 8.3151 3.3 0 4.35 3.67 0 4.46
  [3,226,3.4443,0,8.3151,3.3,0,4.35,3.67,0,4.46],
// 3 226 3.4443 0 8.3151 3.67 0 4.46 4.1 0 4.54
  [3,226,3.4443,0,8.3151,3.67,0,4.46,4.1,0,4.54],
// 4 226 3.4443 0 8.3151 4.1 0 4.54 4.54 0 4.54 6.3639 0 6.3639
  [4,226,3.4443,0,8.3151,4.1,0,4.54,4.54,0,4.54,6.3639,0,6.3639],
// 3 226 6.3639 0 6.3639 4.54 0 4.54 5.1 0 4.41
  [3,226,6.3639,0,6.3639,4.54,0,4.54,5.1,0,4.41],
// 3 226 6.3639 0 6.3639 5.1 0 4.41 5.54 0 4.2
  [3,226,6.3639,0,6.3639,5.1,0,4.41,5.54,0,4.2],
// 3 226 6.3639 0 6.3639 5.54 0 4.2 5.98 0 3.84
  [3,226,6.3639,0,6.3639,5.54,0,4.2,5.98,0,3.84],
// 4 226 6.3639 0 6.3639 5.98 0 3.84 6.29 0 3.47 8.3151 0 3.4443
  [4,226,6.3639,0,6.3639,5.98,0,3.84,6.29,0,3.47,8.3151,0,3.4443],
// 3 226 6.29 0 3.47 6.33 0 3.29 8.3151 0 3.4443
  [3,226,6.29,0,3.47,6.33,0,3.29,8.3151,0,3.4443],
// 3 226 6.33 0 3.29 6.3 0 3.18 8.3151 0 3.4443
  [3,226,6.33,0,3.29,6.3,0,3.18,8.3151,0,3.4443],
// 3 226 6.3 0 3.18 6.21 0 3.07 8.3151 0 3.4443
  [3,226,6.3,0,3.18,6.21,0,3.07,8.3151,0,3.4443],
// 4 226 -2.62 0 4.89 -2.62 0 4.77 2.92 0 3.78 2.9 0 3.89
  [4,226,-2.62,0,4.89,-2.62,0,4.77,2.92,0,3.78,2.9,0,3.89],
// 4 226 -2.62 0 4.77 -2.68 0 4.67 2.99 0 3.68 2.92 0 3.78
  [4,226,-2.62,0,4.77,-2.68,0,4.67,2.99,0,3.68,2.92,0,3.78],
// 4 226 -5.93 0 4.12 -5.66 0 4.52 -6.3639 0 6.3639 -8.3151 0 3.4443
  [4,226,-5.93,0,4.12,-5.66,0,4.52,-6.3639,0,6.3639,-8.3151,0,3.4443],
// 3 226 -5.93 0 4.12 -8.3151 0 3.4443 -5.95 0 3.94
  [3,226,-5.93,0,4.12,-8.3151,0,3.4443,-5.95,0,3.94],
// 4 226 -5.8 0 2.8 -5.91 0 3.83 -5.95 0 3.94 -8.3151 0 3.4443
  [4,226,-5.8,0,2.8,-5.91,0,3.83,-5.95,0,3.94,-8.3151,0,3.4443],
// 3 226 -5.81 0 3.73 -5.91 0 3.83 -5.8 0 2.8
  [3,226,-5.81,0,3.73,-5.91,0,3.83,-5.8,0,2.8],
// 3 226 -5.81 0 3.73 -5.8 0 2.8 -5.69 0 3.7
  [3,226,-5.81,0,3.73,-5.8,0,2.8,-5.69,0,3.7],
// 3 226 -5.69 0 3.7 -5.8 0 2.8 -5.53 0 3.7
  [3,226,-5.69,0,3.7,-5.8,0,2.8,-5.53,0,3.7],
// 4 226 -5.53 0 3.7 -5.8 0 2.8 -4 0 2.8 -5.4 0 3.8
  [4,226,-5.53,0,3.7,-5.8,0,2.8,-4,0,2.8,-5.4,0,3.8],
// 4 226 -5.4 0 3.8 -4 0 2.8 -4.66 0 4.42 -5.09 0 4.13
  [4,226,-5.4,0,3.8,-4,0,2.8,-4.66,0,4.42,-5.09,0,4.13],
// 4 226 -4.66 0 4.42 -4 0 2.8 -3.82 0 4.69 -4.24 0 4.61
  [4,226,-4.66,0,4.42,-4,0,2.8,-3.82,0,4.69,-4.24,0,4.61],
// 4 226 -3.82 0 4.69 -4 0 2.8 -2.99 0 4.61 -3.32 0 4.67
  [4,226,-3.82,0,4.69,-4,0,2.8,-2.99,0,4.61,-3.32,0,4.67],
// 4 226 -2.83 0 4.62 -2.99 0 4.61 -4 0 2.8 -2.2 0 2.8
  [4,226,-2.83,0,4.62,-2.99,0,4.61,-4,0,2.8,-2.2,0,2.8],
// 4 226 -2.83 0 4.62 -2.2 0 2.8 2.2 0 2.8 -2.68 0 4.67
  [4,226,-2.83,0,4.62,-2.2,0,2.8,2.2,0,2.8,-2.68,0,4.67],
// 4 226 -2.68 0 4.67 2.2 0 2.8 3.14 0 3.64 2.99 0 3.68
  [4,226,-2.68,0,4.67,2.2,0,2.8,3.14,0,3.64,2.99,0,3.68],
// 4 226 4 0 2.8 3.3 0 3.65 3.14 0 3.64 2.2 0 2.8
  [4,226,4,0,2.8,3.3,0,3.65,3.14,0,3.64,2.2,0,2.8],
// 4 226 3.3 0 3.65 4 0 2.8 4.13 0 3.81 3.63 0 3.75
  [4,226,3.3,0,3.65,4,0,2.8,4.13,0,3.81,3.63,0,3.75],
// 4 226 4.13 0 3.81 4 0 2.8 4.99 0 3.63 4.56 0 3.78
  [4,226,4.13,0,3.81,4,0,2.8,4.99,0,3.63,4.56,0,3.78],
// 3 226 4.99 0 3.63 4 0 2.8 5.45 0 3.39
  [3,226,4.99,0,3.63,4,0,2.8,5.45,0,3.39],
// 4 226 5.45 0 3.39 4 0 2.8 5.8 0 2.8 5.79 0 3.09
  [4,226,5.45,0,3.39,4,0,2.8,5.8,0,2.8,5.79,0,3.09],
// 3 226 5.79 0 3.09 5.8 0 2.8 5.92 0 3.01
  [3,226,5.79,0,3.09,5.8,0,2.8,5.92,0,3.01],
// 3 226 5.92 0 3.01 5.8 0 2.8 6.08 0 3.02
  [3,226,5.92,0,3.01,5.8,0,2.8,6.08,0,3.02],
// 4 226 6.08 0 3.02 5.8 0 2.8 8.3151 0 3.4443 6.21 0 3.07
  [4,226,6.08,0,3.02,5.8,0,2.8,8.3151,0,3.4443,6.21,0,3.07],
];
module ldraw_lib__98138p1t(step=0, col=false, unit=2/5, alt=false, line=0.2, solid=!$preview)
    makepoly(ldraw_lib__98138p1t(), step=step, col=col, unit=unit, alt=alt, line=line, solid=solid);
ldraw_lib__98138p1t(line=0.2);
